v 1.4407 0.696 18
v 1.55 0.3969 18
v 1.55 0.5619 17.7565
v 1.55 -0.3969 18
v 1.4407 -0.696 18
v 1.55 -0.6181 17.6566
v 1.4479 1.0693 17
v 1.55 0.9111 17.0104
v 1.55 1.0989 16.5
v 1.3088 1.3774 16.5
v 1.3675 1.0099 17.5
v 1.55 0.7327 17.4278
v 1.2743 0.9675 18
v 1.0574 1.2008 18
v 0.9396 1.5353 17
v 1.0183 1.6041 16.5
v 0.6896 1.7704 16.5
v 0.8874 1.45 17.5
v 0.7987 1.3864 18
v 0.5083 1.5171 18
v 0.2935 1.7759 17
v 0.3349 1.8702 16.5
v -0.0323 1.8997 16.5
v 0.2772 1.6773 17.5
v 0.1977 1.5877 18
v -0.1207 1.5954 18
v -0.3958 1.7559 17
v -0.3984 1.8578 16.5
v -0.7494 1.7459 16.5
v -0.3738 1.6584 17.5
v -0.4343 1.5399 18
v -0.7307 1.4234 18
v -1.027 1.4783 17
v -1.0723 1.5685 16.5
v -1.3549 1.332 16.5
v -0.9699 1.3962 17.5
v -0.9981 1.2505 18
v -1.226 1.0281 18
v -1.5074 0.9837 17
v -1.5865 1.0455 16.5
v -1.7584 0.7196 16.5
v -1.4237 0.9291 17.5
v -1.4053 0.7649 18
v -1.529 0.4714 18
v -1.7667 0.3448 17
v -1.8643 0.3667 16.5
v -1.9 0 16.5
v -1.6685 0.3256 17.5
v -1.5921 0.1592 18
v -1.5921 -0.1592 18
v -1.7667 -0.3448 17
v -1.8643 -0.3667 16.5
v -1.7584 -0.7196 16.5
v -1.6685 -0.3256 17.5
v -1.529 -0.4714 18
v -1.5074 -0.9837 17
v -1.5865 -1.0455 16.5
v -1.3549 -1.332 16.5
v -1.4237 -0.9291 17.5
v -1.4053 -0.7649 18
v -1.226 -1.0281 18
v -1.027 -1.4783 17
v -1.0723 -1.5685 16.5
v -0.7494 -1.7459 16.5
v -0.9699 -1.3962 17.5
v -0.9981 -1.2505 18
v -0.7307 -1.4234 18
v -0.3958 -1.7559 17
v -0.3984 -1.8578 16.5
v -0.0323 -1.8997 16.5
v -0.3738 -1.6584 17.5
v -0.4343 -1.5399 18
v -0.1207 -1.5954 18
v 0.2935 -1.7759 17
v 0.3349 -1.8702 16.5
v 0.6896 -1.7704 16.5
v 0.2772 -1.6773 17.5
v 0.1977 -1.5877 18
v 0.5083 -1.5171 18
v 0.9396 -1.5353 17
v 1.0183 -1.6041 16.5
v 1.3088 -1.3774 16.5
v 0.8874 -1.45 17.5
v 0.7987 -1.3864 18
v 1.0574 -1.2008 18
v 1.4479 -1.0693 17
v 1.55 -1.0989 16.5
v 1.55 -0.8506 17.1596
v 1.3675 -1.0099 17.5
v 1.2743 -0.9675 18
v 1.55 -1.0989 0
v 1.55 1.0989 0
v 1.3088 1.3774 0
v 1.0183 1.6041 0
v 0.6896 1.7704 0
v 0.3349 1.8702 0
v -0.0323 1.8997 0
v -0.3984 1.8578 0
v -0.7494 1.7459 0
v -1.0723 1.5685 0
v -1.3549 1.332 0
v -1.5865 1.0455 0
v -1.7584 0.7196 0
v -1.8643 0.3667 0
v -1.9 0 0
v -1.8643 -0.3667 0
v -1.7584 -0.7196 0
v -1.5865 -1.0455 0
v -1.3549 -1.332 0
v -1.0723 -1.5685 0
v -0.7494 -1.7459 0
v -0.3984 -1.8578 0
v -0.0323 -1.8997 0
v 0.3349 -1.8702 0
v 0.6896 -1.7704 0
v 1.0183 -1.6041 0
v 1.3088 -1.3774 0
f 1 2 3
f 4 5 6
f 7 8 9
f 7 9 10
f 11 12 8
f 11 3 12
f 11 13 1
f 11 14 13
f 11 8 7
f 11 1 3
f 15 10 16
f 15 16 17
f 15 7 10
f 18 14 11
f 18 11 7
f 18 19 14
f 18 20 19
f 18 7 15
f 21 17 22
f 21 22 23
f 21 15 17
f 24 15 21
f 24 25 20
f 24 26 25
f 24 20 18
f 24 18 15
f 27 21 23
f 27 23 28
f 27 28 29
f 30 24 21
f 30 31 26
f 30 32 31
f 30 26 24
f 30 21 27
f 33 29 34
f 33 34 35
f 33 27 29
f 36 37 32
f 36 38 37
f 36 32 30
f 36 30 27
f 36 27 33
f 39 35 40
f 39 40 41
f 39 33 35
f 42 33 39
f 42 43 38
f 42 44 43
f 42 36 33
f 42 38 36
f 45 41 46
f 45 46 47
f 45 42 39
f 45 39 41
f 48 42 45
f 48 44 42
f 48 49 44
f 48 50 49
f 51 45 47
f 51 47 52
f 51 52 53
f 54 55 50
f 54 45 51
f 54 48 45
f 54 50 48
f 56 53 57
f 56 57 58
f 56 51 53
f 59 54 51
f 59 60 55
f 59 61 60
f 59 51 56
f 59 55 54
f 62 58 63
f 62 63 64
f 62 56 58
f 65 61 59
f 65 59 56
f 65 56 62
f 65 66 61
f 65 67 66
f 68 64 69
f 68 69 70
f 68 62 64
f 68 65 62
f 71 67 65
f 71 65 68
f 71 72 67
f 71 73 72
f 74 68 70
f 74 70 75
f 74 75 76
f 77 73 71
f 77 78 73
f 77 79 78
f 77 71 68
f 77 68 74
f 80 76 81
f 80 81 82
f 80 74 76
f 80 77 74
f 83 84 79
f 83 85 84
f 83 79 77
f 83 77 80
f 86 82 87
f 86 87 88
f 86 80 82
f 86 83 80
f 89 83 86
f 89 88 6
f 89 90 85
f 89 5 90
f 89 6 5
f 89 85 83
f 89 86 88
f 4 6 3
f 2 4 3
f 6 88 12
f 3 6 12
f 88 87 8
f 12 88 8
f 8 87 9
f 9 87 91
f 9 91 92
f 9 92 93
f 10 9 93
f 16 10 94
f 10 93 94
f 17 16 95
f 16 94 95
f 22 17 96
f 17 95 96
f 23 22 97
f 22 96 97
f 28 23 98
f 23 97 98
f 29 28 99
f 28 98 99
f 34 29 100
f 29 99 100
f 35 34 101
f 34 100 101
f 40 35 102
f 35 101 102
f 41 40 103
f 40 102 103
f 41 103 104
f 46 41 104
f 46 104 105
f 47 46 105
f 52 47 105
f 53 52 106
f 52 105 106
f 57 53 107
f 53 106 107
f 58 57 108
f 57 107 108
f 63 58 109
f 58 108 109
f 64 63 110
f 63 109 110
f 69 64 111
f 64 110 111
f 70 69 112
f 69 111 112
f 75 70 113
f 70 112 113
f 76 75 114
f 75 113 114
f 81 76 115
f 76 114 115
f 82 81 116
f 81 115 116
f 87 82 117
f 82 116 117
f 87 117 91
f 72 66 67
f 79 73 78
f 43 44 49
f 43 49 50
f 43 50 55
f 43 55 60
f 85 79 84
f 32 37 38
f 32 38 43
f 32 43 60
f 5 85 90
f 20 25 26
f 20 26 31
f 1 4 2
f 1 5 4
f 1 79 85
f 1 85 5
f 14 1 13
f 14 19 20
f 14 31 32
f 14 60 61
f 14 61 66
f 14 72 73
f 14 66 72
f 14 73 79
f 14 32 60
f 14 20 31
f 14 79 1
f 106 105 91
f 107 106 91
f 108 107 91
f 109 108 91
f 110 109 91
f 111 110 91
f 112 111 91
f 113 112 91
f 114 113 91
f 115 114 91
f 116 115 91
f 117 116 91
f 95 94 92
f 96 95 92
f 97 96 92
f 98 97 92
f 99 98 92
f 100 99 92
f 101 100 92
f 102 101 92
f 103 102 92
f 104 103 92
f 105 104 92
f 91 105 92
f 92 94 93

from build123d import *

# Parameters (mm, degrees)
SKETCH_1_R          = 1.9
EXTRUDE_1_DEPTH     = 18
CHAMFER_1_SIZE      = 1.5
CHAMFER_1_SIZE2     = 0.3
SKETCH_2_W          = 0.7
SKETCH_2_H          = 3.336204296
CUT_EXTRUDE_1_DEPTH = 18


with BuildPart() as part:
    # 草图1 → 凸台-拉伸1 (new body)
    with BuildSketch(Plane.XY):
        Circle(SKETCH_1_R)
    extrude(amount=EXTRUDE_1_DEPTH)

    # 倒角1
    chamfer_1_edges = [part.edges().sort_by_distance(p)[0] for p in [
        (-1.9, 0, 18),
    ]]
    chamfer_1_side = [part.faces().sort_by_distance(p)[0] for p in [
        (-1.9, 0, 9),
    ]]
    chamfer(chamfer_1_edges, length=CHAMFER_1_SIZE, length2=CHAMFER_1_SIZE2, reference=chamfer_1_side[0])

    # 草图2 → 切除-拉伸1 (cut)
    with BuildSketch(Plane(origin=(0, 0, 0), x_dir=(-1, 0, 0), z_dir=(0, 0, -1))):
        with Locations((-1.9, 0)):
            Rectangle(SKETCH_2_W, SKETCH_2_H)
    extrude(amount=-CUT_EXTRUDE_1_DEPTH, mode=Mode.SUBTRACT)


solid = part.part
